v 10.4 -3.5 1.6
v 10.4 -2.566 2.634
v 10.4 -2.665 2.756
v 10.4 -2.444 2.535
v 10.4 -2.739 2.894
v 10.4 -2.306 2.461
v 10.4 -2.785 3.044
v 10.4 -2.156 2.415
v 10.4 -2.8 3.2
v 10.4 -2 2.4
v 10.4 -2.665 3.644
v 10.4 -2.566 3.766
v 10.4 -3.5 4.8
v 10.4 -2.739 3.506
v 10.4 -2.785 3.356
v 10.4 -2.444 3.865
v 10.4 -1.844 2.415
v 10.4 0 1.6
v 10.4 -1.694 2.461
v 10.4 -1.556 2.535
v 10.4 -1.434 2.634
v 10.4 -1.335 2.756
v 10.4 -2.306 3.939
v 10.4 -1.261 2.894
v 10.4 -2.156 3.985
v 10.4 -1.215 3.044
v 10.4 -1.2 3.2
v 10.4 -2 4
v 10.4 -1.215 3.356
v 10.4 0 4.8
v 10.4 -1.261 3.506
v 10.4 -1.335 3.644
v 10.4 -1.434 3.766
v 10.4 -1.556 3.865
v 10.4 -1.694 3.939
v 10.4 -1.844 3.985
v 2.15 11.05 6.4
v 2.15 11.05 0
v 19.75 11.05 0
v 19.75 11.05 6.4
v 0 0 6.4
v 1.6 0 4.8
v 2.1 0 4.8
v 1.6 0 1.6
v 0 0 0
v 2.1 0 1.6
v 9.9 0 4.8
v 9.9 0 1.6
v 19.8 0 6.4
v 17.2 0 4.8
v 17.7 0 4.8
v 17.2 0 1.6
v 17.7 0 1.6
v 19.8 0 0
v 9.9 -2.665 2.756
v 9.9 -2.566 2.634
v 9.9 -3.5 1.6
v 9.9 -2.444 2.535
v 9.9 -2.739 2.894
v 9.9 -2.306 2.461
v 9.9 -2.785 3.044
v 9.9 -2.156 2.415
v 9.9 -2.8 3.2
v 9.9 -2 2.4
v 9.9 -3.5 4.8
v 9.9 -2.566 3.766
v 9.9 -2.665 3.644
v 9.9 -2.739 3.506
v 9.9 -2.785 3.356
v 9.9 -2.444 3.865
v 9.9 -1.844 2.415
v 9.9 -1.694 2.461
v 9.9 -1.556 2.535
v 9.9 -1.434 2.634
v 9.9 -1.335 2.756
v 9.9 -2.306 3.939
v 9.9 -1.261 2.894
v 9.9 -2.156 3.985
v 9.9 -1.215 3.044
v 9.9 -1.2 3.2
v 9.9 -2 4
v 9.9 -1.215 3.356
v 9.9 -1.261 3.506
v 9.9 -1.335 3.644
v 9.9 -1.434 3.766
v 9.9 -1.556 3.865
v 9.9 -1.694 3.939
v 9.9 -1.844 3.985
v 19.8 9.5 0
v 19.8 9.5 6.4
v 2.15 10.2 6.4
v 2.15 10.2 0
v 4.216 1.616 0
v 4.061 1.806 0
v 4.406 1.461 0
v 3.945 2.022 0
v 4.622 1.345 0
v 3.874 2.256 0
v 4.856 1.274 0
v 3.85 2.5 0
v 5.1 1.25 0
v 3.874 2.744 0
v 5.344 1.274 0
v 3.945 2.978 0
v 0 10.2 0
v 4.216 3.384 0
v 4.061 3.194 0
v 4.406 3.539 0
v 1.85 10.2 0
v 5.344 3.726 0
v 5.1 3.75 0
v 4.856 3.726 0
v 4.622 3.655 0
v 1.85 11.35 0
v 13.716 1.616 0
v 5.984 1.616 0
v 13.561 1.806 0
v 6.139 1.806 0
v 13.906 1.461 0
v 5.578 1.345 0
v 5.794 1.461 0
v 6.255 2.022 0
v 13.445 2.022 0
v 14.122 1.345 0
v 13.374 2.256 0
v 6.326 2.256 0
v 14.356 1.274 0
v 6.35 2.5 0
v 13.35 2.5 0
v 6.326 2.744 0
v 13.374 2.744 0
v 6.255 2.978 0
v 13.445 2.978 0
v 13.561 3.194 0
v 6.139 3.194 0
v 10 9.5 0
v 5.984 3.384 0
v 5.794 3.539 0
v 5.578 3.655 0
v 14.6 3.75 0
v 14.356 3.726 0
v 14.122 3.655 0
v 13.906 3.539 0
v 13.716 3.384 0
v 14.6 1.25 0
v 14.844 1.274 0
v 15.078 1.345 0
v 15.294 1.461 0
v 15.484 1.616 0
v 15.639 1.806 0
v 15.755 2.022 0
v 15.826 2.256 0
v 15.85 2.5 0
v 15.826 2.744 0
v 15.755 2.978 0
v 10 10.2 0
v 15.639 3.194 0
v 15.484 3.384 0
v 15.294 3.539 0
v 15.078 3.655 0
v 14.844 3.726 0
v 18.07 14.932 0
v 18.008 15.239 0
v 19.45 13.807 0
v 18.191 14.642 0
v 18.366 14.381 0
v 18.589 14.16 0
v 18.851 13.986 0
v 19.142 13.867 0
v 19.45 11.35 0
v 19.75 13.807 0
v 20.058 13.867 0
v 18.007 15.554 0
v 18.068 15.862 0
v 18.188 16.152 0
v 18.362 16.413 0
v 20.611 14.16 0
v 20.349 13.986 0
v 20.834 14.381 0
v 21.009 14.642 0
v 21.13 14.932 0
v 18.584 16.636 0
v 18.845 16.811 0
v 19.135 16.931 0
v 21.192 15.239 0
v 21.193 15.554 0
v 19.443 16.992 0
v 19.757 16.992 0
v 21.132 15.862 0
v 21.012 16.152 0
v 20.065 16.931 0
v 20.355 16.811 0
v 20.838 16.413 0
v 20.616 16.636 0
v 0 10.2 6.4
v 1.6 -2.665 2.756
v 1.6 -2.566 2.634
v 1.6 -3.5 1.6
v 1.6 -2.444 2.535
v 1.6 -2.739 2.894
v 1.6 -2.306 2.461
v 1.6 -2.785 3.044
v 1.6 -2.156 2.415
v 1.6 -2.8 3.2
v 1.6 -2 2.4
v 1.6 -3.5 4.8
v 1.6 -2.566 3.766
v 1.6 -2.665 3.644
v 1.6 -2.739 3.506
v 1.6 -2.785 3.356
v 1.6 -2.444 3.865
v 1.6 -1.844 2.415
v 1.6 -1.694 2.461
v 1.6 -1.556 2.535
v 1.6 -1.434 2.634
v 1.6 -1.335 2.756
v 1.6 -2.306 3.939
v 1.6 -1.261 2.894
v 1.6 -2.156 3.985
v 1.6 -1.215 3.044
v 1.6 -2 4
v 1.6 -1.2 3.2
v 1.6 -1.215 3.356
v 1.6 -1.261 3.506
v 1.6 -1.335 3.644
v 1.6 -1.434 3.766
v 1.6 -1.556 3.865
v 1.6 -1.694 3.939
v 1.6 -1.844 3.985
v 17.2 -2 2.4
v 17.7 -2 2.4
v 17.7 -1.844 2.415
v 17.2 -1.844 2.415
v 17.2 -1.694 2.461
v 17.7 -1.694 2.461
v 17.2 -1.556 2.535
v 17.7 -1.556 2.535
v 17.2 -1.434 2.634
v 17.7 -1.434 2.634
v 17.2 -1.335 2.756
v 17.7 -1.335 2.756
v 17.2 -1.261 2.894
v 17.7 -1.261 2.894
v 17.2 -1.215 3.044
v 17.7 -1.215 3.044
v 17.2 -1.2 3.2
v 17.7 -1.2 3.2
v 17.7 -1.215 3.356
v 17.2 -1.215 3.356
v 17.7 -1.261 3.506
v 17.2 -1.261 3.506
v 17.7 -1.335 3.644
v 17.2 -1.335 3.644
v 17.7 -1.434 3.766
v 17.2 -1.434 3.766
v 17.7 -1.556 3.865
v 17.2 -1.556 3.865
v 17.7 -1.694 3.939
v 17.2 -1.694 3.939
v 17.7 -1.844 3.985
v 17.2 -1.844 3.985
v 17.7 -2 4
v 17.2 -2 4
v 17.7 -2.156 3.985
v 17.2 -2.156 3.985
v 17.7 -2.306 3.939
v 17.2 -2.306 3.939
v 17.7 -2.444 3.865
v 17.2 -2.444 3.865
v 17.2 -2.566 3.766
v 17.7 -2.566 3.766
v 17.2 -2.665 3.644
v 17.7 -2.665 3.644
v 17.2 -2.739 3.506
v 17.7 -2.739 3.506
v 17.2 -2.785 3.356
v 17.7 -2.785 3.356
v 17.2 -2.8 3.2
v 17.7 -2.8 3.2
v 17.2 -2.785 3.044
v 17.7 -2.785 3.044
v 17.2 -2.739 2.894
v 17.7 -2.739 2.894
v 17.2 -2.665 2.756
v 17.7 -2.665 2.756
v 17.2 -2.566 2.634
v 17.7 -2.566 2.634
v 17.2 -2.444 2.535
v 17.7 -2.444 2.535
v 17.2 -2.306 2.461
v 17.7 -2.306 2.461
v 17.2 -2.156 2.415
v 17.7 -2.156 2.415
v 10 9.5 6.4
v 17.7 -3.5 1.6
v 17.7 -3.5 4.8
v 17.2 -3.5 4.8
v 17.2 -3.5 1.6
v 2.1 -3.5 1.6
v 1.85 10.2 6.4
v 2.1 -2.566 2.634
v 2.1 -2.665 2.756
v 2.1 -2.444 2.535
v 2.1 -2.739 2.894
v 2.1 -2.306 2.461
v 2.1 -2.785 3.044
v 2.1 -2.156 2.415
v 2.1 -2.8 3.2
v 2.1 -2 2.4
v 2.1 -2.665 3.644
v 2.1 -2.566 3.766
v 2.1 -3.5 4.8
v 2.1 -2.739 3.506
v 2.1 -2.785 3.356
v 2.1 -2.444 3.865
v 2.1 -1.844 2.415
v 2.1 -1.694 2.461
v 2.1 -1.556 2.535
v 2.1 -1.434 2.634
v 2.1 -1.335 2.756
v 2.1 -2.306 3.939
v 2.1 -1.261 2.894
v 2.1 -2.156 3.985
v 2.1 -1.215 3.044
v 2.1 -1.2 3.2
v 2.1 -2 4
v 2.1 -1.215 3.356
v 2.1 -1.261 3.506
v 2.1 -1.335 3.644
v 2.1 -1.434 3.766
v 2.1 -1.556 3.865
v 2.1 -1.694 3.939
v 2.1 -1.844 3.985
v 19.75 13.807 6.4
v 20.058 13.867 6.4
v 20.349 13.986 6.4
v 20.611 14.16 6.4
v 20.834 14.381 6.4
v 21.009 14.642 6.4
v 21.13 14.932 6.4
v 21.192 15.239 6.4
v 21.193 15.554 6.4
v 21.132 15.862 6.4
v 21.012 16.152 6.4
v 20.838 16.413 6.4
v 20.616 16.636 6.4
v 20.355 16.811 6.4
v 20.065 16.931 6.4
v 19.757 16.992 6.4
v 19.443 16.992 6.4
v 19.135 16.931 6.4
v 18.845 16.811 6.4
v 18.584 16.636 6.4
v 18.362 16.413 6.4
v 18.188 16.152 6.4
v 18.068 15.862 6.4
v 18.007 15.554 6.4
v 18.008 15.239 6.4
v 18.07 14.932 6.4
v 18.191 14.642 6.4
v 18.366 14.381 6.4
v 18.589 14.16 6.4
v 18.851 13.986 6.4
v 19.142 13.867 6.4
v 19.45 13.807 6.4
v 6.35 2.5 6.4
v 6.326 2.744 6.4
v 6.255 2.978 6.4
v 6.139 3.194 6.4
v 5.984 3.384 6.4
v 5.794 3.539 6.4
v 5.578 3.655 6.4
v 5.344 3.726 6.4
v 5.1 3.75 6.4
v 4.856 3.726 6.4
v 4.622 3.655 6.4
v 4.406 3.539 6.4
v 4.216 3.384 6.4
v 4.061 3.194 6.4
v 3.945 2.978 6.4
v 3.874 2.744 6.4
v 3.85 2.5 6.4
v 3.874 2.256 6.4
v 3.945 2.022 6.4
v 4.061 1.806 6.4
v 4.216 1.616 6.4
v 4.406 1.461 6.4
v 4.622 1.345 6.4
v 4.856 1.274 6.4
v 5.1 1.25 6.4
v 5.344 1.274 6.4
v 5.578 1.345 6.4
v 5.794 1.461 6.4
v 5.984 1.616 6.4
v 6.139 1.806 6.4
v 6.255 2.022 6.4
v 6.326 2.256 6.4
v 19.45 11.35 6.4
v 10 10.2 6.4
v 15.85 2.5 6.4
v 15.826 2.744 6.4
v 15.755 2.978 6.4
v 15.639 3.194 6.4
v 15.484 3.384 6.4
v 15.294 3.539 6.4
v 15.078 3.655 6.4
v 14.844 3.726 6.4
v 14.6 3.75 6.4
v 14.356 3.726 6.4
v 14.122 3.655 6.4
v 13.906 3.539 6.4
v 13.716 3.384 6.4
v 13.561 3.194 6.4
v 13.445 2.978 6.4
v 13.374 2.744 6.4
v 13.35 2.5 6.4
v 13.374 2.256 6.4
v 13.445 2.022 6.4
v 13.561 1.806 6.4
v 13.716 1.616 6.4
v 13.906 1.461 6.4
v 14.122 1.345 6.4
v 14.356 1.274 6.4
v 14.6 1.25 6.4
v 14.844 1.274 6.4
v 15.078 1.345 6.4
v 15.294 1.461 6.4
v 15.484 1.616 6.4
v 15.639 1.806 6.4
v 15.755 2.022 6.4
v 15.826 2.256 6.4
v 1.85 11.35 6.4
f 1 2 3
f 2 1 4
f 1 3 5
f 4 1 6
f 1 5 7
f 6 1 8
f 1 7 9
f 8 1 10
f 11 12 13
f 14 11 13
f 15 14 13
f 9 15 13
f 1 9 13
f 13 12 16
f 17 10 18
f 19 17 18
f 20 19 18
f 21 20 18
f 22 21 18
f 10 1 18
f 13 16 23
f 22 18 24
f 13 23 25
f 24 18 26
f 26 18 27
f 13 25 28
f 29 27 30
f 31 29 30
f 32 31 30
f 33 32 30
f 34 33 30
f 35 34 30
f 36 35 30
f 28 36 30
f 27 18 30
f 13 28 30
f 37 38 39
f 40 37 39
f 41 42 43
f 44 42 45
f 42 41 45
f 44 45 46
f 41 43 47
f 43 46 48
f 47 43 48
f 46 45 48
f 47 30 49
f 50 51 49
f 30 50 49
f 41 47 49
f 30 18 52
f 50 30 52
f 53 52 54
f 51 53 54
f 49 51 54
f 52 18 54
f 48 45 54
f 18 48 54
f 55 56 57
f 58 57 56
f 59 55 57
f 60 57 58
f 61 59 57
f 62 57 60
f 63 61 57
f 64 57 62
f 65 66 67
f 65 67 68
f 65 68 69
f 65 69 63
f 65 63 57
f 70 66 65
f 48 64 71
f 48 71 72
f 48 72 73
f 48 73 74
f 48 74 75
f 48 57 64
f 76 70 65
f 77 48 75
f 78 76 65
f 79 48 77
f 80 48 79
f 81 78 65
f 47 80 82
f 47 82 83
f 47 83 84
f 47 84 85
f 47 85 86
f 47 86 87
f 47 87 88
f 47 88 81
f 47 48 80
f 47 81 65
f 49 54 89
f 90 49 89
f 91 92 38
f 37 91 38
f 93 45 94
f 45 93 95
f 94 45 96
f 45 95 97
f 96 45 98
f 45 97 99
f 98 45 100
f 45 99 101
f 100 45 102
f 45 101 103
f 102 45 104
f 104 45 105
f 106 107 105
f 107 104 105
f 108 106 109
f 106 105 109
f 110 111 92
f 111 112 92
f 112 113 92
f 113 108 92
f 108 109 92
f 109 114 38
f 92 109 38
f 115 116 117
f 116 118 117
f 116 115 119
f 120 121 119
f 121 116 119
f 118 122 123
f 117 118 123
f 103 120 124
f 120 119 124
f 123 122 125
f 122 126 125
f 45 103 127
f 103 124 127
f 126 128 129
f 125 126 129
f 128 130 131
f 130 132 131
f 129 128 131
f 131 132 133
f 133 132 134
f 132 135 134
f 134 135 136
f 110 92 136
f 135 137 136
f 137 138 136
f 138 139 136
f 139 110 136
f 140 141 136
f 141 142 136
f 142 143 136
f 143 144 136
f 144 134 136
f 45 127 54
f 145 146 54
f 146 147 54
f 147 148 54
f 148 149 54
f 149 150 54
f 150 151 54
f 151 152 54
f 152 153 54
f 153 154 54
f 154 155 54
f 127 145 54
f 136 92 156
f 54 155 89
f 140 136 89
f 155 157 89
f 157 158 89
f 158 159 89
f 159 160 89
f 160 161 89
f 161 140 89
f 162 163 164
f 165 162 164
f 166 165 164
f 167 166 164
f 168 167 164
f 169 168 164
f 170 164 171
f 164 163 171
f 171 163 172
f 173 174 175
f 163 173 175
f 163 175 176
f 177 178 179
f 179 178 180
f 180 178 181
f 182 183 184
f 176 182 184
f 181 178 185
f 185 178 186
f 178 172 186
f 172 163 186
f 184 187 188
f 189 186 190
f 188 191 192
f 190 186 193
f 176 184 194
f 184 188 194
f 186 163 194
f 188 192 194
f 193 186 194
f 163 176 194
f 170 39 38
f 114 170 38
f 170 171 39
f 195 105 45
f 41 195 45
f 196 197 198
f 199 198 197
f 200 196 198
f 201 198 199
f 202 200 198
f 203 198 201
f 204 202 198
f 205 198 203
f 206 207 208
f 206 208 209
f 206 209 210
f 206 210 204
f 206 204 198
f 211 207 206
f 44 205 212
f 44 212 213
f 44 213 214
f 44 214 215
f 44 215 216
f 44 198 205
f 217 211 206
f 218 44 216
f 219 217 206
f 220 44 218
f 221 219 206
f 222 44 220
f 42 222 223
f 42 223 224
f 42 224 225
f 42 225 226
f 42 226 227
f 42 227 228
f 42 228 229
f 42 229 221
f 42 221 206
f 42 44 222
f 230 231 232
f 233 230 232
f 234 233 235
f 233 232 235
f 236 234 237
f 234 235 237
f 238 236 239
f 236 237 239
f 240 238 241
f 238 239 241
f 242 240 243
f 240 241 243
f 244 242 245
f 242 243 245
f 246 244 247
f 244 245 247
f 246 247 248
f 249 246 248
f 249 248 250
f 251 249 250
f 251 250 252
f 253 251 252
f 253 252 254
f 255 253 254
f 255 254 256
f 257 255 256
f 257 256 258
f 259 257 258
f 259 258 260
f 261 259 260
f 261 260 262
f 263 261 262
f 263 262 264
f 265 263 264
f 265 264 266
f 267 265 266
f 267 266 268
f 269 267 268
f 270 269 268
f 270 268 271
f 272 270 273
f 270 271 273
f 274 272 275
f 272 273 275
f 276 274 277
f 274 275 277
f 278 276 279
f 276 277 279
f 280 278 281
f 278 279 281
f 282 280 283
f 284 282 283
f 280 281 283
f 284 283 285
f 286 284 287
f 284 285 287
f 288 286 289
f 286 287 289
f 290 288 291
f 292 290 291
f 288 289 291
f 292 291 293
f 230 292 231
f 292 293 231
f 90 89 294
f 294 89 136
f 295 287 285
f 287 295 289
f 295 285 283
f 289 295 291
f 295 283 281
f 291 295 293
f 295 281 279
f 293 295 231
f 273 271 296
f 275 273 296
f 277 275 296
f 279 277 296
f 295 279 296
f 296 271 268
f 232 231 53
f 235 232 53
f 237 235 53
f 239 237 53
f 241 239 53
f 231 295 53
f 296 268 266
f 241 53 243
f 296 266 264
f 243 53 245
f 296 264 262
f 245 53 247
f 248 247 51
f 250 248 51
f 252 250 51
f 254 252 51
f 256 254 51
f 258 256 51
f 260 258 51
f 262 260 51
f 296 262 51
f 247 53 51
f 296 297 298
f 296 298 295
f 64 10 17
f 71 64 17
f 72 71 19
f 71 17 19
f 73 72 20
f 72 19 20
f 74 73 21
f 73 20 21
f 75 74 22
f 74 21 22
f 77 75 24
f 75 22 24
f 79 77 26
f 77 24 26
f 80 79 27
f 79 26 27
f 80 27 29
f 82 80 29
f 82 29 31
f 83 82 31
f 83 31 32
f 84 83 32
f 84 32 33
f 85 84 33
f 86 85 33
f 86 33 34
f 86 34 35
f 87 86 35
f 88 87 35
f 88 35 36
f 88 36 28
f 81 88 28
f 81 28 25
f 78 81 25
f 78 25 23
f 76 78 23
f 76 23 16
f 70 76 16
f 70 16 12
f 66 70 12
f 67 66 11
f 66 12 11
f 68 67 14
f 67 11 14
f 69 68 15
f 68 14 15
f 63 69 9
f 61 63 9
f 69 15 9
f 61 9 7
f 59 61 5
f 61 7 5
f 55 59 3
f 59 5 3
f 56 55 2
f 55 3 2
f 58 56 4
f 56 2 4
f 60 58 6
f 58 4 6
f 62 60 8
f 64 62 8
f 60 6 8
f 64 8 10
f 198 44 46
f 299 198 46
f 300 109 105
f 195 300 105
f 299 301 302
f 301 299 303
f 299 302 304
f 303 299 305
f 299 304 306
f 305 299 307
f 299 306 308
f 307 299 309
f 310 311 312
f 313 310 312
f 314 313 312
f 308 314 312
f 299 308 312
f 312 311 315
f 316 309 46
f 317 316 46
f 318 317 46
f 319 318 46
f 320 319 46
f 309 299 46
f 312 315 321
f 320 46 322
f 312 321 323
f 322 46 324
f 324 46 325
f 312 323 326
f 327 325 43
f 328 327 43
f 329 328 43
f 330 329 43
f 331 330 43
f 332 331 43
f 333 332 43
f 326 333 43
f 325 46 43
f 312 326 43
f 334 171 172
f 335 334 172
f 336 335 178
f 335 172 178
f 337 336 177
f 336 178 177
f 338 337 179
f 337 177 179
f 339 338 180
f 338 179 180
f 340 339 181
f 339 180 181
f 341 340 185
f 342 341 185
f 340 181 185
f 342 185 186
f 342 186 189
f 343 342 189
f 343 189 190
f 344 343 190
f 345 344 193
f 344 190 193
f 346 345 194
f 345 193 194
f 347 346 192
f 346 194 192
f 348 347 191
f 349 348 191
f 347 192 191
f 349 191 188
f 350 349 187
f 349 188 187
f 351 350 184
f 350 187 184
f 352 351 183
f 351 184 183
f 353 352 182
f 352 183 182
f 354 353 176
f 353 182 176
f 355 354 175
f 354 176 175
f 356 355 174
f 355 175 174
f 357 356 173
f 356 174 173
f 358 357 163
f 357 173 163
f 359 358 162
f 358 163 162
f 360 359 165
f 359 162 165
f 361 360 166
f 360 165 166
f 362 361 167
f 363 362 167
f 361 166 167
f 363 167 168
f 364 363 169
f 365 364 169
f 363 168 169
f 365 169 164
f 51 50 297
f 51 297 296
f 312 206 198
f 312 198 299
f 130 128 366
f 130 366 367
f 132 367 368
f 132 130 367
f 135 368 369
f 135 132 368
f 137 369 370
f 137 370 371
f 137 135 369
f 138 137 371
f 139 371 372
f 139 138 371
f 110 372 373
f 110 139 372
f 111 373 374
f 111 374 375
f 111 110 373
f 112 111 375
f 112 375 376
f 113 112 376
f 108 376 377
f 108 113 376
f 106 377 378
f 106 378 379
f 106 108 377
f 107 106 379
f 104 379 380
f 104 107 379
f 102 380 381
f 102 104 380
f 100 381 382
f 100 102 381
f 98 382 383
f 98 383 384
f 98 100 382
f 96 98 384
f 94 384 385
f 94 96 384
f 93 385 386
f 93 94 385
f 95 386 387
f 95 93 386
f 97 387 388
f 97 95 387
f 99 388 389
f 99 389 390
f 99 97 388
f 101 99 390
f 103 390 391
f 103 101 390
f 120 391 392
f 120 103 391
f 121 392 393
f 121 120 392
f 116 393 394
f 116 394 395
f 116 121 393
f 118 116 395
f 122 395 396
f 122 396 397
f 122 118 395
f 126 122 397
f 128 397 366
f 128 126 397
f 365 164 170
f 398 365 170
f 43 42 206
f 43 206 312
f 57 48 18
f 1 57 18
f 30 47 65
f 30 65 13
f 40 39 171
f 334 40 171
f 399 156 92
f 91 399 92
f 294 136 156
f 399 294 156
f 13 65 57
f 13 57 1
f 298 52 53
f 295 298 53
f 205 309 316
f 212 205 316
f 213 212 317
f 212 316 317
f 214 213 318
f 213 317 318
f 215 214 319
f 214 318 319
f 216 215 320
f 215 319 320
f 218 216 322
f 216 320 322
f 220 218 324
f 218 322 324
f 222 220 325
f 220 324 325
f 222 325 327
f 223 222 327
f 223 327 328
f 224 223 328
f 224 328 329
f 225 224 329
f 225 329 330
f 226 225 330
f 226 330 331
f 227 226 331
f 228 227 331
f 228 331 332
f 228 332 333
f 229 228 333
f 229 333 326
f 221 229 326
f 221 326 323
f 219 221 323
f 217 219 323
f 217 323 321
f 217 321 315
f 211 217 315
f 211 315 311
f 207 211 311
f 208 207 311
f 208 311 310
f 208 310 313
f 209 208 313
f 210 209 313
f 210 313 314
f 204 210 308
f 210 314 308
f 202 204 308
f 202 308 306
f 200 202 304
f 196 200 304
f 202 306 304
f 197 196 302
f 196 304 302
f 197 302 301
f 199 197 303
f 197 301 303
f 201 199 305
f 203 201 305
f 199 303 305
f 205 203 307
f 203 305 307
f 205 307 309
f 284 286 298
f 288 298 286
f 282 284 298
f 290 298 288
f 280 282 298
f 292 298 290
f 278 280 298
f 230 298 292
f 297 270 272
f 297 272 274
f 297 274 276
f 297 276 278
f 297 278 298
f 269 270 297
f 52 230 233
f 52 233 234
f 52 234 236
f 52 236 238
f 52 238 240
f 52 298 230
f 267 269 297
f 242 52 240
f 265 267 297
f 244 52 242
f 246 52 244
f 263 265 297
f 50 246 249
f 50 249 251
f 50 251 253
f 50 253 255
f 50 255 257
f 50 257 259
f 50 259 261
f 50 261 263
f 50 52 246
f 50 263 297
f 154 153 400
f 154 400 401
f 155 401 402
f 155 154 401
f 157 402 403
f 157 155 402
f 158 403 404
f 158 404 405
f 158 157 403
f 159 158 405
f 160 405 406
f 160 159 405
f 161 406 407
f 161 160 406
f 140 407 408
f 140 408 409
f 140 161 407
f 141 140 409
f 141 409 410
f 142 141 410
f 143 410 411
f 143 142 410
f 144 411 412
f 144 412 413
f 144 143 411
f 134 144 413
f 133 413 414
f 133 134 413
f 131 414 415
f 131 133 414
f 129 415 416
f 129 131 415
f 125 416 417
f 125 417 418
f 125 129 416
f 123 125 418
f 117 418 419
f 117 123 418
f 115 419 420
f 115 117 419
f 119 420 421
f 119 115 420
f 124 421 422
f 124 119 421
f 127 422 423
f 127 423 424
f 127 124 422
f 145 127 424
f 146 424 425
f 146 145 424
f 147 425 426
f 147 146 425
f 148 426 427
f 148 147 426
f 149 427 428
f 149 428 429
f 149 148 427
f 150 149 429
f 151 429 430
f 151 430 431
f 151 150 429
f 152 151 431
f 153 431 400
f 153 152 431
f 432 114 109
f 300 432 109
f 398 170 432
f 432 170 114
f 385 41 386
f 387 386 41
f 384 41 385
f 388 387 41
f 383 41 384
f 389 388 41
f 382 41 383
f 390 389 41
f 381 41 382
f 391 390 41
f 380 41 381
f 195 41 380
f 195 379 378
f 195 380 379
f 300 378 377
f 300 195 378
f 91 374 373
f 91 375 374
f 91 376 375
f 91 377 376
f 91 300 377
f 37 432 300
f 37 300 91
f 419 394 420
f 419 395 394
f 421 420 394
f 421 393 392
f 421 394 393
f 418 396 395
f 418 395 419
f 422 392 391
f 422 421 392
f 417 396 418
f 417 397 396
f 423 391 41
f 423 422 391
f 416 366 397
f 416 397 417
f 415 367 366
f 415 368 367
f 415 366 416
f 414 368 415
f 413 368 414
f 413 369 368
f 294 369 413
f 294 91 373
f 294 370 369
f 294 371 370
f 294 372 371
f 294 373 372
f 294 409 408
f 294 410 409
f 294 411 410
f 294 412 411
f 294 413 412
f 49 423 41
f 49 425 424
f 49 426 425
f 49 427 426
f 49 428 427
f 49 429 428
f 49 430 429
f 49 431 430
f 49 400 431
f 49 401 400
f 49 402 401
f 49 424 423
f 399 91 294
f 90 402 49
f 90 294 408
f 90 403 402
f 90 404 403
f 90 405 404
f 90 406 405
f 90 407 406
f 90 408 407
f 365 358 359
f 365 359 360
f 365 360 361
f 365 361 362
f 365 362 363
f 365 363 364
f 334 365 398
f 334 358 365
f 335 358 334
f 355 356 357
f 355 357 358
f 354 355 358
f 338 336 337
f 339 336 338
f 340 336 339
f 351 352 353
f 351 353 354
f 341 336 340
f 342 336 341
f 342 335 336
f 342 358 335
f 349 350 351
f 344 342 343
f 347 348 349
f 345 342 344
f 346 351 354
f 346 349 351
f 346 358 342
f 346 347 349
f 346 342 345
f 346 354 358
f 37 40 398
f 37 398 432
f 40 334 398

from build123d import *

# Parameters (mm, degrees)
SKETCH1_R           = 1.25
BOSS_EXTRUDE1_DEPTH = 6.4
SKETCH2_W           = 0.5
SKETCH2_H           = 3.2
BOSS_EXTRUDE2_DEPTH = 3.5
CUT_EXTRUDE1_REACH  = 27.362
SKETCH3_R           = 0.8


with BuildPart() as part:
    # Sketch1 → Boss-Extrude1 (new body)
    with BuildSketch(Plane.XY):
        with BuildLine():
            Line((0, 0), (19.8, 0))
            Line((19.8, 0), (19.8, 9.5))
            Line((19.8, 9.5), (10, 9.5))
            Line((10, 9.5), (10, 10.2))
            Line((10, 10.2), (2.15, 10.2))
            Line((2.15, 10.2), (2.15, 11.05))
            Line((2.15, 11.05), (19.75, 11.05))
            Line((19.75, 11.05), (19.75, 13.807046768))
            ThreePointArc((19.75, 13.807046768), (19.6, 17), (19.45, 13.807046768))
            Line((19.45, 13.807046768), (19.45, 11.35))
            Line((19.45, 11.35), (1.85, 11.35))
            Line((1.85, 11.35), (1.85, 10.2))
            Line((1.85, 10.2), (0, 10.2))
            Line((0, 10.2), (0, 4.415474079))
            Line((0, 4.415474079), (0, 0))
        make_face()
        with Locations((14.6, 2.5)):
            Circle(SKETCH1_R, mode=Mode.SUBTRACT)
        with Locations((5.1, 2.5)):
            Circle(SKETCH1_R, mode=Mode.SUBTRACT)
    extrude(amount=BOSS_EXTRUDE1_DEPTH)

    # Sketch2 → Boss-Extrude2 (add)
    with BuildSketch(Plane.XZ):
        with Locations((1.85, 3.2)):
            Rectangle(SKETCH2_W, SKETCH2_H)
        with Locations((10.15, 3.2)):
            Rectangle(SKETCH2_W, SKETCH2_H)
        with Locations((17.45, 3.2)):
            Rectangle(SKETCH2_W, SKETCH2_H)
    extrude(amount=BOSS_EXTRUDE2_DEPTH)

    # Cut-Extrude1: up to this face of the body (flat: up to its plane)
    cut_extrude1_end = Plane(part.part.faces().sort_by_distance((1.6, -1.75, 3.2))[0])
    # Sketch3 → Cut-Extrude1 (cut, up to the picked face)
    with BuildSketch(Plane(origin=(17.7, 0, 0), x_dir=(0, 0, -1), z_dir=(1, 0, 0)), mode=Mode.PRIVATE) as cut_extrude1_sk1:
        with Locations((-3.2, -2)):
            Circle(SKETCH3_R)
    cut_extrude1_tool1 = split(extrude(cut_extrude1_sk1.sketch, amount=-CUT_EXTRUDE1_REACH, mode=Mode.PRIVATE), bisect_by=cut_extrude1_end, keep=Keep.BOTH, mode=Mode.PRIVATE)
    add(cut_extrude1_tool1.solids().sort_by(Axis((17.7, -2, 3.2), (-1, 0, 0)))[0], mode=Mode.SUBTRACT)


solid = part.part
